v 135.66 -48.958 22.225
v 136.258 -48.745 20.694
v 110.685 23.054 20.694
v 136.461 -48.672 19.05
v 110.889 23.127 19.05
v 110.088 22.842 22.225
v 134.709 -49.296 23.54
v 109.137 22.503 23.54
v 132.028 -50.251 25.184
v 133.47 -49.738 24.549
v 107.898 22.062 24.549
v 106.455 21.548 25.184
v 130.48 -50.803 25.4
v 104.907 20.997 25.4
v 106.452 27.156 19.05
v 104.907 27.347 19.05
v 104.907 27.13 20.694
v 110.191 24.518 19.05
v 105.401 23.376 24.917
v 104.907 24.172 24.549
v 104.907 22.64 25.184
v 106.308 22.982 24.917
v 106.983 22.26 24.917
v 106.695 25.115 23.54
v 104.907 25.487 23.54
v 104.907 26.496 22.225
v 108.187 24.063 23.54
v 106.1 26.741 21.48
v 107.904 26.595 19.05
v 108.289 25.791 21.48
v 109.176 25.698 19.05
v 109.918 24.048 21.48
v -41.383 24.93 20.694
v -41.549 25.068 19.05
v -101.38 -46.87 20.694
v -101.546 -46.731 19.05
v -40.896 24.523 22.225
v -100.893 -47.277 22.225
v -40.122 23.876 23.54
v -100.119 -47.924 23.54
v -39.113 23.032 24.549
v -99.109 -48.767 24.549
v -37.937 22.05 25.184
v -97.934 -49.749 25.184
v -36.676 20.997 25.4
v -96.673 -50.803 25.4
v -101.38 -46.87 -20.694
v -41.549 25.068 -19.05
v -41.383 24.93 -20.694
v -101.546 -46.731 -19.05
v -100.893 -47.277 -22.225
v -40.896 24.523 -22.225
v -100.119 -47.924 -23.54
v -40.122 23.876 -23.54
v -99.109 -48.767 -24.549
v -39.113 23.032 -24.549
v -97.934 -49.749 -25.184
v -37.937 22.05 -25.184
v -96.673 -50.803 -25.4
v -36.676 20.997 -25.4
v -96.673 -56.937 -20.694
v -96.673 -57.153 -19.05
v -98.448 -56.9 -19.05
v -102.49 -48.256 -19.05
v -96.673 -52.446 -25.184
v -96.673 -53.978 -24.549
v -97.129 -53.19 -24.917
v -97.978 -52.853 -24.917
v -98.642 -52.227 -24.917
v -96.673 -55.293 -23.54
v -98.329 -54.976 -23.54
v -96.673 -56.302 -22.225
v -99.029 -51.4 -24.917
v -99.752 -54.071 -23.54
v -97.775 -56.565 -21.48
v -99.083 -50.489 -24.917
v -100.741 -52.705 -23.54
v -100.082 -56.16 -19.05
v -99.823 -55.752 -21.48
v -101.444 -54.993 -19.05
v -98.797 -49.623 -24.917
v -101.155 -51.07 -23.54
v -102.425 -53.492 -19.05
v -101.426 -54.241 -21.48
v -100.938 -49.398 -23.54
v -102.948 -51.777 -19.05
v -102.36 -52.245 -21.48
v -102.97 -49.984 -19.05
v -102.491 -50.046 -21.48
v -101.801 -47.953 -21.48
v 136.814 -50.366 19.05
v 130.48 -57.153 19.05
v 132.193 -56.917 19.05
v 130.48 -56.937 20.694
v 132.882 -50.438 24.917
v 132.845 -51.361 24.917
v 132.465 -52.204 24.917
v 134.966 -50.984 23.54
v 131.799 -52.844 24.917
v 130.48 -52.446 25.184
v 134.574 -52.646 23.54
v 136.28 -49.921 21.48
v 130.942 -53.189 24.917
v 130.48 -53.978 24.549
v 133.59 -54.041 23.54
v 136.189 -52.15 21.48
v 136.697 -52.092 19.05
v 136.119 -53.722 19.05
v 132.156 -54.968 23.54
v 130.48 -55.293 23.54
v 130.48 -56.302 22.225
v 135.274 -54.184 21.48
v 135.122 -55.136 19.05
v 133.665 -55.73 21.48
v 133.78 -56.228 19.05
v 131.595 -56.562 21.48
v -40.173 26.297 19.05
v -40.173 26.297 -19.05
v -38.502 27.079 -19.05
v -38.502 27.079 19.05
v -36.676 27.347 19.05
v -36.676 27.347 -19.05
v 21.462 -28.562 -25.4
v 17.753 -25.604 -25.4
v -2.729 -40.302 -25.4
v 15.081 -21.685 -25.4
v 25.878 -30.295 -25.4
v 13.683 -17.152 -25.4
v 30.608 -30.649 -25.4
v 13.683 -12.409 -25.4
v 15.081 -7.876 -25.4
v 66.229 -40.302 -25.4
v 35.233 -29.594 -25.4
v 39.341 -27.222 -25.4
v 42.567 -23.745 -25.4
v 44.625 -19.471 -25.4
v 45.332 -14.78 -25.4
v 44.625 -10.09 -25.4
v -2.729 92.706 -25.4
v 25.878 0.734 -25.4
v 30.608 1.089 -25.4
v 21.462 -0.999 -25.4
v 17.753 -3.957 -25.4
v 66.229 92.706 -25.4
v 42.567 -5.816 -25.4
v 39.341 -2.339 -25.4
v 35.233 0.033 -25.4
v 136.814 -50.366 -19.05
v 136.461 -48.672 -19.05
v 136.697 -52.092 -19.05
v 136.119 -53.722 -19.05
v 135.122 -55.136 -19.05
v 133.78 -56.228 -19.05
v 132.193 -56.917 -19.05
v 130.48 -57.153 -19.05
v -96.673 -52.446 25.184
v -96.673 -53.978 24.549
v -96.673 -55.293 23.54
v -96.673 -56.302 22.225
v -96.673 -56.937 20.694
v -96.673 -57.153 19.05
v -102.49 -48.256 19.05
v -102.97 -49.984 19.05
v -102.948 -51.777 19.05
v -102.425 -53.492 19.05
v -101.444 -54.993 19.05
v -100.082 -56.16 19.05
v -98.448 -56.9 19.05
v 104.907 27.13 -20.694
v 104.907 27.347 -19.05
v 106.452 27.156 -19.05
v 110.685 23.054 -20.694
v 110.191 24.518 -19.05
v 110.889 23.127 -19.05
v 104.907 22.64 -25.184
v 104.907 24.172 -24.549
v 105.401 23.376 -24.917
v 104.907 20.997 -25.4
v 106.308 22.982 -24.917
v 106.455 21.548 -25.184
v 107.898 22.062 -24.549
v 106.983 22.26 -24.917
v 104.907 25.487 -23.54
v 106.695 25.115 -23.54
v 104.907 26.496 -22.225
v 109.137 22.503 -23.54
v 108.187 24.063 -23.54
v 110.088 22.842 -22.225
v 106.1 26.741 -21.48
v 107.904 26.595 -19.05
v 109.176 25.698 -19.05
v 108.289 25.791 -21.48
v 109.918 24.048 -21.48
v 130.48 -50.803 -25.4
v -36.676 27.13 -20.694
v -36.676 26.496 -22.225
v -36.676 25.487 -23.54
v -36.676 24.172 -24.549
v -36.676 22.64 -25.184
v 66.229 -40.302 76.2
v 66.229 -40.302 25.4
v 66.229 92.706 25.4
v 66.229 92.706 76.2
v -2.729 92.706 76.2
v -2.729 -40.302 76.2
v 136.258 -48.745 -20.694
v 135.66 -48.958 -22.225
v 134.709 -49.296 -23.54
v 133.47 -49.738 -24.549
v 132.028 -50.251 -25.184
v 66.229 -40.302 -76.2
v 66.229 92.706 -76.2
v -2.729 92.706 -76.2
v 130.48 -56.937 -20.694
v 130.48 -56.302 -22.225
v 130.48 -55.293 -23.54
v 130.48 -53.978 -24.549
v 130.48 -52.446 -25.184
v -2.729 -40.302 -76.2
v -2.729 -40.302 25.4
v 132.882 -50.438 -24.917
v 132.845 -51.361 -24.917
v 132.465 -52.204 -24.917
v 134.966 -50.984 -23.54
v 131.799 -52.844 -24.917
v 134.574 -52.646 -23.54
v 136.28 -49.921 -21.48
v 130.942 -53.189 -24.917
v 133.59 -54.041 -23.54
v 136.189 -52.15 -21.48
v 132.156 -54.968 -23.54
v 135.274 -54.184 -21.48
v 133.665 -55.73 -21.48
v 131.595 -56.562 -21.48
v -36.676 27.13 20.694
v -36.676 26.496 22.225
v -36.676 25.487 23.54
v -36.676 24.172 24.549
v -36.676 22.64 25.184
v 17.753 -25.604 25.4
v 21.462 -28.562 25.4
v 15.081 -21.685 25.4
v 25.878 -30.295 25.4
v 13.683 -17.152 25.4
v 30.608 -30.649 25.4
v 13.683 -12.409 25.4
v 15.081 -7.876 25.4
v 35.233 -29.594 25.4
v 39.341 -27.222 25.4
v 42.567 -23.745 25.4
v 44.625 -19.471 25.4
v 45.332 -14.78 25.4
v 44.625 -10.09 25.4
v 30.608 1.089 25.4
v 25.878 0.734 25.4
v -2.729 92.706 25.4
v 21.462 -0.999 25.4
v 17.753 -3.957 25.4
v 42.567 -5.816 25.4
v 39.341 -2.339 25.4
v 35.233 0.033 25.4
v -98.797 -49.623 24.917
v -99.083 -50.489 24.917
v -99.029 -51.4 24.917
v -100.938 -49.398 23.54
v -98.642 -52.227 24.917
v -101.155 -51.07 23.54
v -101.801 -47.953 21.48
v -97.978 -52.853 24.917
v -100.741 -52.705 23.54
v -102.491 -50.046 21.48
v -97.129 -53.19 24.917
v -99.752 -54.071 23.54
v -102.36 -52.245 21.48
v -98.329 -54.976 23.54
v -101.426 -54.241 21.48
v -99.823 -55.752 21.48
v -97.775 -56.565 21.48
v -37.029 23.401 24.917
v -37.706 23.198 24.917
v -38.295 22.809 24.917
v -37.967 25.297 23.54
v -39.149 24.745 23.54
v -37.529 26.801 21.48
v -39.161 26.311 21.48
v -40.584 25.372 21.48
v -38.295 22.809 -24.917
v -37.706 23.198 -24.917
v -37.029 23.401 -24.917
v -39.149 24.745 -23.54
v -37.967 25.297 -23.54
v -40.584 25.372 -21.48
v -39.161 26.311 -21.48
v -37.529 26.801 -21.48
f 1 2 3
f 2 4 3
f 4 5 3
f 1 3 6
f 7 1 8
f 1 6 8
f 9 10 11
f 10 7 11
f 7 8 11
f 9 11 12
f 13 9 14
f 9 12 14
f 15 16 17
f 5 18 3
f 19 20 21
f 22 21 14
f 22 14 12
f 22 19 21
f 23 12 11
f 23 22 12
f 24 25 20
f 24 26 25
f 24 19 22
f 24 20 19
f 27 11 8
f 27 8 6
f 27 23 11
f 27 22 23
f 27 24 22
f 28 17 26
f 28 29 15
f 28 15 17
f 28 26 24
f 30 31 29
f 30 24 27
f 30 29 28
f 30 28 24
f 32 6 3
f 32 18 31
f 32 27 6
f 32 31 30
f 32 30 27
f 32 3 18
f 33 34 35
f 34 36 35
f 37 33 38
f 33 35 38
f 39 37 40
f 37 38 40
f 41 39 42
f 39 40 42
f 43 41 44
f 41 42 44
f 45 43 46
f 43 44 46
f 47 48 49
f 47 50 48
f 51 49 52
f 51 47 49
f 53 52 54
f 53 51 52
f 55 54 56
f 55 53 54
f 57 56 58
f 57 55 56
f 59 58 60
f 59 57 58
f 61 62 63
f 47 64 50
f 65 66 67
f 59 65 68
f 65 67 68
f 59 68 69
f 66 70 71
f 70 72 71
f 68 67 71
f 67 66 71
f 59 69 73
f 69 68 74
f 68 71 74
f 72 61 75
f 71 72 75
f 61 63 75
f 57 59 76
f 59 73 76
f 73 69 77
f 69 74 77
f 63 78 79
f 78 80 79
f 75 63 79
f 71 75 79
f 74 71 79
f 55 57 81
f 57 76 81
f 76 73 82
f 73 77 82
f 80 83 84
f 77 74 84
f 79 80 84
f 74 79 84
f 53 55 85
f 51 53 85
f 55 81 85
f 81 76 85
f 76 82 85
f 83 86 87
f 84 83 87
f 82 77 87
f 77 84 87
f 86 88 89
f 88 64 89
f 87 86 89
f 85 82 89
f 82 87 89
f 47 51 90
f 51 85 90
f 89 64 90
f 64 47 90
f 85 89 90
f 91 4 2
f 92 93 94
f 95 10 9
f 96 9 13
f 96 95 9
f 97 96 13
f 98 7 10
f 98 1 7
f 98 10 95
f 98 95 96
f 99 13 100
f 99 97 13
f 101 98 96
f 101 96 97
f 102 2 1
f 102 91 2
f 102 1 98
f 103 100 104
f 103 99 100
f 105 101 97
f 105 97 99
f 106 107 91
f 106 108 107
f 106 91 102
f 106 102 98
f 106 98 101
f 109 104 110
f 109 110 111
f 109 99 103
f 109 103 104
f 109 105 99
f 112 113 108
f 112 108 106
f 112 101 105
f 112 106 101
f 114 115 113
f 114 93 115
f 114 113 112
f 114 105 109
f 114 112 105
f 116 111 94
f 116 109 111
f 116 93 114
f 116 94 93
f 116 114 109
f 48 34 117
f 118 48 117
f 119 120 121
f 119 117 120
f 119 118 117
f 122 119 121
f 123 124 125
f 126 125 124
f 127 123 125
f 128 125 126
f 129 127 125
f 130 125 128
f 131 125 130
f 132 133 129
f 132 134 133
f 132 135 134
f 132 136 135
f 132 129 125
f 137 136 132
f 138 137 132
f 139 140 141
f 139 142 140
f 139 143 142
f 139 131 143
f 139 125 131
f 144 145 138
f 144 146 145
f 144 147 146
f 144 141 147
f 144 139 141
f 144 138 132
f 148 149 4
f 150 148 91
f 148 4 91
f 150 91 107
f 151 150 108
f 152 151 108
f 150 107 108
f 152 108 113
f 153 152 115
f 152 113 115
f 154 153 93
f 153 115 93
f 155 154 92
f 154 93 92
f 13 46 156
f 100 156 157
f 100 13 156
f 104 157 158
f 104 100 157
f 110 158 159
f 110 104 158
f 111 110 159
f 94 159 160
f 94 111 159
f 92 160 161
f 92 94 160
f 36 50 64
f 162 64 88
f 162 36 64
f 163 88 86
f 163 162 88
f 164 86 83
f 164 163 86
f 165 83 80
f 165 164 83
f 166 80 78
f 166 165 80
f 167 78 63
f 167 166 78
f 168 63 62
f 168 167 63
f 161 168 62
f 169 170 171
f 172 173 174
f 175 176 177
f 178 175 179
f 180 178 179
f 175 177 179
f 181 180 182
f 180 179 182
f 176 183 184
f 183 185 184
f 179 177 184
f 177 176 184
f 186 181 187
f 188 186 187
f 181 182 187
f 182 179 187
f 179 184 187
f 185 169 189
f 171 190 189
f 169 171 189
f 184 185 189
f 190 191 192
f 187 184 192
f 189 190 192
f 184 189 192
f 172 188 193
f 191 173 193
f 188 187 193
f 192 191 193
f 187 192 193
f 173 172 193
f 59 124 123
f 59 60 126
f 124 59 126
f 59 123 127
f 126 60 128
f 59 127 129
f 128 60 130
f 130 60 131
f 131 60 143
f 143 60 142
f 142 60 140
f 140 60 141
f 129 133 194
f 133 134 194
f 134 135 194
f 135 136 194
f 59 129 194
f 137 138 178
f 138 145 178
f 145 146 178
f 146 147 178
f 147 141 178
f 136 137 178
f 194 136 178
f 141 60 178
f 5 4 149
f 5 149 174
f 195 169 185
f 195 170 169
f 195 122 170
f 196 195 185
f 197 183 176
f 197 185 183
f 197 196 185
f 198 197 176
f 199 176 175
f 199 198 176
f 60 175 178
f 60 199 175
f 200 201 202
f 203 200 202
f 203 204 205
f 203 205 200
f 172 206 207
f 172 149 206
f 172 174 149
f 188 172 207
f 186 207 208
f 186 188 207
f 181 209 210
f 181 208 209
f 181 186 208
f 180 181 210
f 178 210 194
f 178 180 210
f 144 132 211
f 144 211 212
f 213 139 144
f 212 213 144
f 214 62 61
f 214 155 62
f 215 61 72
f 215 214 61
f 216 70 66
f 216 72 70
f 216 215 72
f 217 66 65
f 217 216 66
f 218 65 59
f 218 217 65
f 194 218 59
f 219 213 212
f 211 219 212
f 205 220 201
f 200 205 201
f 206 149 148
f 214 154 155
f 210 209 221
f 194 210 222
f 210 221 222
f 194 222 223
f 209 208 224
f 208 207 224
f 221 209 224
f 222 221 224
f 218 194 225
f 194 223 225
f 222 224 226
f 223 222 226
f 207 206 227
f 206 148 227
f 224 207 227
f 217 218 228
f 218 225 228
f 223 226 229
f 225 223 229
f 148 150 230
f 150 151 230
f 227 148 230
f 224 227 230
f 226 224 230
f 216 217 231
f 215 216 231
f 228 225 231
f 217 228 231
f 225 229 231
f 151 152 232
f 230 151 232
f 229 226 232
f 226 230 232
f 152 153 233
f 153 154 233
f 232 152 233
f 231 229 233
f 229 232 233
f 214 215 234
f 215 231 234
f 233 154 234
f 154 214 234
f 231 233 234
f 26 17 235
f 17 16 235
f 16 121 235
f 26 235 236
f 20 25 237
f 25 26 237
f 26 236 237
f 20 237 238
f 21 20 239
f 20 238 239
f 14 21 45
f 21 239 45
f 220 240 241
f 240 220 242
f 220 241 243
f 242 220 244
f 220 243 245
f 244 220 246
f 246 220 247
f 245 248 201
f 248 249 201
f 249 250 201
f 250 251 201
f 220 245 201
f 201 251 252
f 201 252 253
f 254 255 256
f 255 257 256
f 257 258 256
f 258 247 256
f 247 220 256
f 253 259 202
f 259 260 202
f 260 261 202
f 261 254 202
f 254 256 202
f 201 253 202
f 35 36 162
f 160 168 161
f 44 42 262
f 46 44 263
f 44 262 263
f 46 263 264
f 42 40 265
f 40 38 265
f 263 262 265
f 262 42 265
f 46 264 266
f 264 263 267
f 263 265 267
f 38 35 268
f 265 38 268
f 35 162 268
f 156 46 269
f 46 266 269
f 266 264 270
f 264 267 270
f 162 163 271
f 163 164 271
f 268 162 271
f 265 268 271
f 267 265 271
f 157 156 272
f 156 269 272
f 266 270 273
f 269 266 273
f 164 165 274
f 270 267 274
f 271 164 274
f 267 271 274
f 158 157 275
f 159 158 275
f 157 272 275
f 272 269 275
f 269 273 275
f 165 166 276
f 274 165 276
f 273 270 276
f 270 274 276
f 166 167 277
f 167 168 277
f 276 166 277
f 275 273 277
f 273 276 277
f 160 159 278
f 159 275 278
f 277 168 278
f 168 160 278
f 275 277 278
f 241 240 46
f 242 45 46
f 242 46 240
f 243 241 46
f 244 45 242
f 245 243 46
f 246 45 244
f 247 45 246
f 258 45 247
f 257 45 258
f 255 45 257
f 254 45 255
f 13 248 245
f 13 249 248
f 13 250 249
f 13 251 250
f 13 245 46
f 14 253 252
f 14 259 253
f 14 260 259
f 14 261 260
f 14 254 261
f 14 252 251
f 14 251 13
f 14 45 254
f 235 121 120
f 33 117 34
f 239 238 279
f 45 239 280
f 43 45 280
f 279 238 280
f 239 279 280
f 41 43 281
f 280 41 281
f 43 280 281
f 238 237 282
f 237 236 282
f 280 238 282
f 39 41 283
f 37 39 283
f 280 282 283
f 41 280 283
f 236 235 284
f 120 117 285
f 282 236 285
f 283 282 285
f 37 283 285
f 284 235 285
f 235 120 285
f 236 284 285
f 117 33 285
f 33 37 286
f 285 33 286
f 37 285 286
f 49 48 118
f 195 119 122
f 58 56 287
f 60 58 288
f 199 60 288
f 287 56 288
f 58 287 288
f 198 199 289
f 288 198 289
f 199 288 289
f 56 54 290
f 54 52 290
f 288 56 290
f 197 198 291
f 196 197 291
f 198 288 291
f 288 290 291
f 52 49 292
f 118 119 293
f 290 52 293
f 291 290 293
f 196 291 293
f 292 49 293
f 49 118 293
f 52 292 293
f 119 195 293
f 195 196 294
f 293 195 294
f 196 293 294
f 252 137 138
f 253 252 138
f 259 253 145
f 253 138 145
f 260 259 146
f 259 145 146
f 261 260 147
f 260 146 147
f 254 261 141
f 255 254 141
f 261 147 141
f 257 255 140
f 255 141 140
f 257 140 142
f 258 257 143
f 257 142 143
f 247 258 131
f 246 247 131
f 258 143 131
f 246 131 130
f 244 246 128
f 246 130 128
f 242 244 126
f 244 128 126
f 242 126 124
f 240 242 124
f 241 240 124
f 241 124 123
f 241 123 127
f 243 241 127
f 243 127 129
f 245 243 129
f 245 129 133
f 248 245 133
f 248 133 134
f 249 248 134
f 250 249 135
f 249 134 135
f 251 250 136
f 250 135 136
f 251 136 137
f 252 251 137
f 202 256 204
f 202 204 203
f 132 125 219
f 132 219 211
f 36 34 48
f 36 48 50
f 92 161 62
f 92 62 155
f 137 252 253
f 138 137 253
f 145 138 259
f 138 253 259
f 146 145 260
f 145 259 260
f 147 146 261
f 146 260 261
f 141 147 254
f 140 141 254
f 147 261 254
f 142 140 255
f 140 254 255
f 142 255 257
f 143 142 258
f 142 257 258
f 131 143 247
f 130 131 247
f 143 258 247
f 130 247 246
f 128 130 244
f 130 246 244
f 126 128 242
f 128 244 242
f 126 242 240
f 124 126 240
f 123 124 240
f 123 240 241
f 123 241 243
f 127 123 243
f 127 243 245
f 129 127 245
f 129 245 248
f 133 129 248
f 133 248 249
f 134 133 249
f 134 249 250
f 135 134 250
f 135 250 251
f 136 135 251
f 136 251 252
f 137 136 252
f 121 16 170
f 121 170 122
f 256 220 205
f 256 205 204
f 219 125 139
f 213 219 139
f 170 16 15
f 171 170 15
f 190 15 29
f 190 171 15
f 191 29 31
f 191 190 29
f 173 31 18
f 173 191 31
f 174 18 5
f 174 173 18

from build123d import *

# Parameters (mm, degrees)
F1_DEPTH = 25.4
F2_R     = 6.35
F3_R     = 15.9134591768
F4_DEPTH = 50.801
F5_W     = 68.9585166983
F5_H     = 133.0089531839
F6_DEPTH = 50.8
F8_R     = 15.9134591768
F9_DEPTH = 50.8


with BuildPart() as f1:
    # F0 (on Top) → F1 (new body, symmetric)
    with BuildSketch(Plane.XY):
        Polygon((-39.645280689, 27.3465514183), (-110.2543845773, -57.1528710425), (139.4819170237, -57.1528710425), (109.386228025, 27.3465514183), align=None)
    extrude(amount=F1_DEPTH, both=True)

    # F2
    f2_edges = [f1.edges().sort_by_distance(p)[0] for p in [
        (109.386228, 27.346551, 0),
        (34.870474, 27.346551, -25.4),
        (-39.645281, 27.346551, 0),
        (34.870474, 27.346551, 25.4),
        (-74.949833, -14.90316, -25.4),
        (-110.254385, -57.152871, 0),
        (-74.949833, -14.90316, 25.4),
        (139.481917, -57.152871, 0),
        (124.434073, -14.90316, -25.4),
        (124.434073, -14.90316, 25.4),
        (14.613766, -57.152871, -25.4),
        (14.613766, -57.152871, 25.4),
    ]]
    fillet(f2_edges, radius=F2_R)

    # F3 (on face) → F4 (cut, through all)
    with BuildSketch(Plane.XY.offset(25.4)):
        with Locations((29.4188149273, -14.7804608569)):
            Circle(F3_R)
    extrude(amount=-F4_DEPTH, mode=Mode.SUBTRACT)


with BuildPart() as f6:
    # F5 (on face) → F6 (new body)
    with BuildSketch(Plane.XY.offset(25.4)):
        with Locations((31.7501595709, 26.2020025402)):
            Rectangle(F5_W, F5_H)
    extrude(amount=F6_DEPTH)


with BuildPart() as f7_1:
    # F7: instance of F6
    add(f6.part.mirror(Plane.XY))


with BuildPart() as f6_1:
    add(f6.part)

    add(f7_1.part)  # F9 merges F7_1
    # F8 (on face) → F9 (join, through all)
    with BuildSketch(Plane.XY.offset(-25.4)):
        with Locations((29.4188149273, -14.7804608569)):
            Circle(F8_R)
    extrude(amount=F9_DEPTH)


solid = Compound([f1.part, f6_1.part])
